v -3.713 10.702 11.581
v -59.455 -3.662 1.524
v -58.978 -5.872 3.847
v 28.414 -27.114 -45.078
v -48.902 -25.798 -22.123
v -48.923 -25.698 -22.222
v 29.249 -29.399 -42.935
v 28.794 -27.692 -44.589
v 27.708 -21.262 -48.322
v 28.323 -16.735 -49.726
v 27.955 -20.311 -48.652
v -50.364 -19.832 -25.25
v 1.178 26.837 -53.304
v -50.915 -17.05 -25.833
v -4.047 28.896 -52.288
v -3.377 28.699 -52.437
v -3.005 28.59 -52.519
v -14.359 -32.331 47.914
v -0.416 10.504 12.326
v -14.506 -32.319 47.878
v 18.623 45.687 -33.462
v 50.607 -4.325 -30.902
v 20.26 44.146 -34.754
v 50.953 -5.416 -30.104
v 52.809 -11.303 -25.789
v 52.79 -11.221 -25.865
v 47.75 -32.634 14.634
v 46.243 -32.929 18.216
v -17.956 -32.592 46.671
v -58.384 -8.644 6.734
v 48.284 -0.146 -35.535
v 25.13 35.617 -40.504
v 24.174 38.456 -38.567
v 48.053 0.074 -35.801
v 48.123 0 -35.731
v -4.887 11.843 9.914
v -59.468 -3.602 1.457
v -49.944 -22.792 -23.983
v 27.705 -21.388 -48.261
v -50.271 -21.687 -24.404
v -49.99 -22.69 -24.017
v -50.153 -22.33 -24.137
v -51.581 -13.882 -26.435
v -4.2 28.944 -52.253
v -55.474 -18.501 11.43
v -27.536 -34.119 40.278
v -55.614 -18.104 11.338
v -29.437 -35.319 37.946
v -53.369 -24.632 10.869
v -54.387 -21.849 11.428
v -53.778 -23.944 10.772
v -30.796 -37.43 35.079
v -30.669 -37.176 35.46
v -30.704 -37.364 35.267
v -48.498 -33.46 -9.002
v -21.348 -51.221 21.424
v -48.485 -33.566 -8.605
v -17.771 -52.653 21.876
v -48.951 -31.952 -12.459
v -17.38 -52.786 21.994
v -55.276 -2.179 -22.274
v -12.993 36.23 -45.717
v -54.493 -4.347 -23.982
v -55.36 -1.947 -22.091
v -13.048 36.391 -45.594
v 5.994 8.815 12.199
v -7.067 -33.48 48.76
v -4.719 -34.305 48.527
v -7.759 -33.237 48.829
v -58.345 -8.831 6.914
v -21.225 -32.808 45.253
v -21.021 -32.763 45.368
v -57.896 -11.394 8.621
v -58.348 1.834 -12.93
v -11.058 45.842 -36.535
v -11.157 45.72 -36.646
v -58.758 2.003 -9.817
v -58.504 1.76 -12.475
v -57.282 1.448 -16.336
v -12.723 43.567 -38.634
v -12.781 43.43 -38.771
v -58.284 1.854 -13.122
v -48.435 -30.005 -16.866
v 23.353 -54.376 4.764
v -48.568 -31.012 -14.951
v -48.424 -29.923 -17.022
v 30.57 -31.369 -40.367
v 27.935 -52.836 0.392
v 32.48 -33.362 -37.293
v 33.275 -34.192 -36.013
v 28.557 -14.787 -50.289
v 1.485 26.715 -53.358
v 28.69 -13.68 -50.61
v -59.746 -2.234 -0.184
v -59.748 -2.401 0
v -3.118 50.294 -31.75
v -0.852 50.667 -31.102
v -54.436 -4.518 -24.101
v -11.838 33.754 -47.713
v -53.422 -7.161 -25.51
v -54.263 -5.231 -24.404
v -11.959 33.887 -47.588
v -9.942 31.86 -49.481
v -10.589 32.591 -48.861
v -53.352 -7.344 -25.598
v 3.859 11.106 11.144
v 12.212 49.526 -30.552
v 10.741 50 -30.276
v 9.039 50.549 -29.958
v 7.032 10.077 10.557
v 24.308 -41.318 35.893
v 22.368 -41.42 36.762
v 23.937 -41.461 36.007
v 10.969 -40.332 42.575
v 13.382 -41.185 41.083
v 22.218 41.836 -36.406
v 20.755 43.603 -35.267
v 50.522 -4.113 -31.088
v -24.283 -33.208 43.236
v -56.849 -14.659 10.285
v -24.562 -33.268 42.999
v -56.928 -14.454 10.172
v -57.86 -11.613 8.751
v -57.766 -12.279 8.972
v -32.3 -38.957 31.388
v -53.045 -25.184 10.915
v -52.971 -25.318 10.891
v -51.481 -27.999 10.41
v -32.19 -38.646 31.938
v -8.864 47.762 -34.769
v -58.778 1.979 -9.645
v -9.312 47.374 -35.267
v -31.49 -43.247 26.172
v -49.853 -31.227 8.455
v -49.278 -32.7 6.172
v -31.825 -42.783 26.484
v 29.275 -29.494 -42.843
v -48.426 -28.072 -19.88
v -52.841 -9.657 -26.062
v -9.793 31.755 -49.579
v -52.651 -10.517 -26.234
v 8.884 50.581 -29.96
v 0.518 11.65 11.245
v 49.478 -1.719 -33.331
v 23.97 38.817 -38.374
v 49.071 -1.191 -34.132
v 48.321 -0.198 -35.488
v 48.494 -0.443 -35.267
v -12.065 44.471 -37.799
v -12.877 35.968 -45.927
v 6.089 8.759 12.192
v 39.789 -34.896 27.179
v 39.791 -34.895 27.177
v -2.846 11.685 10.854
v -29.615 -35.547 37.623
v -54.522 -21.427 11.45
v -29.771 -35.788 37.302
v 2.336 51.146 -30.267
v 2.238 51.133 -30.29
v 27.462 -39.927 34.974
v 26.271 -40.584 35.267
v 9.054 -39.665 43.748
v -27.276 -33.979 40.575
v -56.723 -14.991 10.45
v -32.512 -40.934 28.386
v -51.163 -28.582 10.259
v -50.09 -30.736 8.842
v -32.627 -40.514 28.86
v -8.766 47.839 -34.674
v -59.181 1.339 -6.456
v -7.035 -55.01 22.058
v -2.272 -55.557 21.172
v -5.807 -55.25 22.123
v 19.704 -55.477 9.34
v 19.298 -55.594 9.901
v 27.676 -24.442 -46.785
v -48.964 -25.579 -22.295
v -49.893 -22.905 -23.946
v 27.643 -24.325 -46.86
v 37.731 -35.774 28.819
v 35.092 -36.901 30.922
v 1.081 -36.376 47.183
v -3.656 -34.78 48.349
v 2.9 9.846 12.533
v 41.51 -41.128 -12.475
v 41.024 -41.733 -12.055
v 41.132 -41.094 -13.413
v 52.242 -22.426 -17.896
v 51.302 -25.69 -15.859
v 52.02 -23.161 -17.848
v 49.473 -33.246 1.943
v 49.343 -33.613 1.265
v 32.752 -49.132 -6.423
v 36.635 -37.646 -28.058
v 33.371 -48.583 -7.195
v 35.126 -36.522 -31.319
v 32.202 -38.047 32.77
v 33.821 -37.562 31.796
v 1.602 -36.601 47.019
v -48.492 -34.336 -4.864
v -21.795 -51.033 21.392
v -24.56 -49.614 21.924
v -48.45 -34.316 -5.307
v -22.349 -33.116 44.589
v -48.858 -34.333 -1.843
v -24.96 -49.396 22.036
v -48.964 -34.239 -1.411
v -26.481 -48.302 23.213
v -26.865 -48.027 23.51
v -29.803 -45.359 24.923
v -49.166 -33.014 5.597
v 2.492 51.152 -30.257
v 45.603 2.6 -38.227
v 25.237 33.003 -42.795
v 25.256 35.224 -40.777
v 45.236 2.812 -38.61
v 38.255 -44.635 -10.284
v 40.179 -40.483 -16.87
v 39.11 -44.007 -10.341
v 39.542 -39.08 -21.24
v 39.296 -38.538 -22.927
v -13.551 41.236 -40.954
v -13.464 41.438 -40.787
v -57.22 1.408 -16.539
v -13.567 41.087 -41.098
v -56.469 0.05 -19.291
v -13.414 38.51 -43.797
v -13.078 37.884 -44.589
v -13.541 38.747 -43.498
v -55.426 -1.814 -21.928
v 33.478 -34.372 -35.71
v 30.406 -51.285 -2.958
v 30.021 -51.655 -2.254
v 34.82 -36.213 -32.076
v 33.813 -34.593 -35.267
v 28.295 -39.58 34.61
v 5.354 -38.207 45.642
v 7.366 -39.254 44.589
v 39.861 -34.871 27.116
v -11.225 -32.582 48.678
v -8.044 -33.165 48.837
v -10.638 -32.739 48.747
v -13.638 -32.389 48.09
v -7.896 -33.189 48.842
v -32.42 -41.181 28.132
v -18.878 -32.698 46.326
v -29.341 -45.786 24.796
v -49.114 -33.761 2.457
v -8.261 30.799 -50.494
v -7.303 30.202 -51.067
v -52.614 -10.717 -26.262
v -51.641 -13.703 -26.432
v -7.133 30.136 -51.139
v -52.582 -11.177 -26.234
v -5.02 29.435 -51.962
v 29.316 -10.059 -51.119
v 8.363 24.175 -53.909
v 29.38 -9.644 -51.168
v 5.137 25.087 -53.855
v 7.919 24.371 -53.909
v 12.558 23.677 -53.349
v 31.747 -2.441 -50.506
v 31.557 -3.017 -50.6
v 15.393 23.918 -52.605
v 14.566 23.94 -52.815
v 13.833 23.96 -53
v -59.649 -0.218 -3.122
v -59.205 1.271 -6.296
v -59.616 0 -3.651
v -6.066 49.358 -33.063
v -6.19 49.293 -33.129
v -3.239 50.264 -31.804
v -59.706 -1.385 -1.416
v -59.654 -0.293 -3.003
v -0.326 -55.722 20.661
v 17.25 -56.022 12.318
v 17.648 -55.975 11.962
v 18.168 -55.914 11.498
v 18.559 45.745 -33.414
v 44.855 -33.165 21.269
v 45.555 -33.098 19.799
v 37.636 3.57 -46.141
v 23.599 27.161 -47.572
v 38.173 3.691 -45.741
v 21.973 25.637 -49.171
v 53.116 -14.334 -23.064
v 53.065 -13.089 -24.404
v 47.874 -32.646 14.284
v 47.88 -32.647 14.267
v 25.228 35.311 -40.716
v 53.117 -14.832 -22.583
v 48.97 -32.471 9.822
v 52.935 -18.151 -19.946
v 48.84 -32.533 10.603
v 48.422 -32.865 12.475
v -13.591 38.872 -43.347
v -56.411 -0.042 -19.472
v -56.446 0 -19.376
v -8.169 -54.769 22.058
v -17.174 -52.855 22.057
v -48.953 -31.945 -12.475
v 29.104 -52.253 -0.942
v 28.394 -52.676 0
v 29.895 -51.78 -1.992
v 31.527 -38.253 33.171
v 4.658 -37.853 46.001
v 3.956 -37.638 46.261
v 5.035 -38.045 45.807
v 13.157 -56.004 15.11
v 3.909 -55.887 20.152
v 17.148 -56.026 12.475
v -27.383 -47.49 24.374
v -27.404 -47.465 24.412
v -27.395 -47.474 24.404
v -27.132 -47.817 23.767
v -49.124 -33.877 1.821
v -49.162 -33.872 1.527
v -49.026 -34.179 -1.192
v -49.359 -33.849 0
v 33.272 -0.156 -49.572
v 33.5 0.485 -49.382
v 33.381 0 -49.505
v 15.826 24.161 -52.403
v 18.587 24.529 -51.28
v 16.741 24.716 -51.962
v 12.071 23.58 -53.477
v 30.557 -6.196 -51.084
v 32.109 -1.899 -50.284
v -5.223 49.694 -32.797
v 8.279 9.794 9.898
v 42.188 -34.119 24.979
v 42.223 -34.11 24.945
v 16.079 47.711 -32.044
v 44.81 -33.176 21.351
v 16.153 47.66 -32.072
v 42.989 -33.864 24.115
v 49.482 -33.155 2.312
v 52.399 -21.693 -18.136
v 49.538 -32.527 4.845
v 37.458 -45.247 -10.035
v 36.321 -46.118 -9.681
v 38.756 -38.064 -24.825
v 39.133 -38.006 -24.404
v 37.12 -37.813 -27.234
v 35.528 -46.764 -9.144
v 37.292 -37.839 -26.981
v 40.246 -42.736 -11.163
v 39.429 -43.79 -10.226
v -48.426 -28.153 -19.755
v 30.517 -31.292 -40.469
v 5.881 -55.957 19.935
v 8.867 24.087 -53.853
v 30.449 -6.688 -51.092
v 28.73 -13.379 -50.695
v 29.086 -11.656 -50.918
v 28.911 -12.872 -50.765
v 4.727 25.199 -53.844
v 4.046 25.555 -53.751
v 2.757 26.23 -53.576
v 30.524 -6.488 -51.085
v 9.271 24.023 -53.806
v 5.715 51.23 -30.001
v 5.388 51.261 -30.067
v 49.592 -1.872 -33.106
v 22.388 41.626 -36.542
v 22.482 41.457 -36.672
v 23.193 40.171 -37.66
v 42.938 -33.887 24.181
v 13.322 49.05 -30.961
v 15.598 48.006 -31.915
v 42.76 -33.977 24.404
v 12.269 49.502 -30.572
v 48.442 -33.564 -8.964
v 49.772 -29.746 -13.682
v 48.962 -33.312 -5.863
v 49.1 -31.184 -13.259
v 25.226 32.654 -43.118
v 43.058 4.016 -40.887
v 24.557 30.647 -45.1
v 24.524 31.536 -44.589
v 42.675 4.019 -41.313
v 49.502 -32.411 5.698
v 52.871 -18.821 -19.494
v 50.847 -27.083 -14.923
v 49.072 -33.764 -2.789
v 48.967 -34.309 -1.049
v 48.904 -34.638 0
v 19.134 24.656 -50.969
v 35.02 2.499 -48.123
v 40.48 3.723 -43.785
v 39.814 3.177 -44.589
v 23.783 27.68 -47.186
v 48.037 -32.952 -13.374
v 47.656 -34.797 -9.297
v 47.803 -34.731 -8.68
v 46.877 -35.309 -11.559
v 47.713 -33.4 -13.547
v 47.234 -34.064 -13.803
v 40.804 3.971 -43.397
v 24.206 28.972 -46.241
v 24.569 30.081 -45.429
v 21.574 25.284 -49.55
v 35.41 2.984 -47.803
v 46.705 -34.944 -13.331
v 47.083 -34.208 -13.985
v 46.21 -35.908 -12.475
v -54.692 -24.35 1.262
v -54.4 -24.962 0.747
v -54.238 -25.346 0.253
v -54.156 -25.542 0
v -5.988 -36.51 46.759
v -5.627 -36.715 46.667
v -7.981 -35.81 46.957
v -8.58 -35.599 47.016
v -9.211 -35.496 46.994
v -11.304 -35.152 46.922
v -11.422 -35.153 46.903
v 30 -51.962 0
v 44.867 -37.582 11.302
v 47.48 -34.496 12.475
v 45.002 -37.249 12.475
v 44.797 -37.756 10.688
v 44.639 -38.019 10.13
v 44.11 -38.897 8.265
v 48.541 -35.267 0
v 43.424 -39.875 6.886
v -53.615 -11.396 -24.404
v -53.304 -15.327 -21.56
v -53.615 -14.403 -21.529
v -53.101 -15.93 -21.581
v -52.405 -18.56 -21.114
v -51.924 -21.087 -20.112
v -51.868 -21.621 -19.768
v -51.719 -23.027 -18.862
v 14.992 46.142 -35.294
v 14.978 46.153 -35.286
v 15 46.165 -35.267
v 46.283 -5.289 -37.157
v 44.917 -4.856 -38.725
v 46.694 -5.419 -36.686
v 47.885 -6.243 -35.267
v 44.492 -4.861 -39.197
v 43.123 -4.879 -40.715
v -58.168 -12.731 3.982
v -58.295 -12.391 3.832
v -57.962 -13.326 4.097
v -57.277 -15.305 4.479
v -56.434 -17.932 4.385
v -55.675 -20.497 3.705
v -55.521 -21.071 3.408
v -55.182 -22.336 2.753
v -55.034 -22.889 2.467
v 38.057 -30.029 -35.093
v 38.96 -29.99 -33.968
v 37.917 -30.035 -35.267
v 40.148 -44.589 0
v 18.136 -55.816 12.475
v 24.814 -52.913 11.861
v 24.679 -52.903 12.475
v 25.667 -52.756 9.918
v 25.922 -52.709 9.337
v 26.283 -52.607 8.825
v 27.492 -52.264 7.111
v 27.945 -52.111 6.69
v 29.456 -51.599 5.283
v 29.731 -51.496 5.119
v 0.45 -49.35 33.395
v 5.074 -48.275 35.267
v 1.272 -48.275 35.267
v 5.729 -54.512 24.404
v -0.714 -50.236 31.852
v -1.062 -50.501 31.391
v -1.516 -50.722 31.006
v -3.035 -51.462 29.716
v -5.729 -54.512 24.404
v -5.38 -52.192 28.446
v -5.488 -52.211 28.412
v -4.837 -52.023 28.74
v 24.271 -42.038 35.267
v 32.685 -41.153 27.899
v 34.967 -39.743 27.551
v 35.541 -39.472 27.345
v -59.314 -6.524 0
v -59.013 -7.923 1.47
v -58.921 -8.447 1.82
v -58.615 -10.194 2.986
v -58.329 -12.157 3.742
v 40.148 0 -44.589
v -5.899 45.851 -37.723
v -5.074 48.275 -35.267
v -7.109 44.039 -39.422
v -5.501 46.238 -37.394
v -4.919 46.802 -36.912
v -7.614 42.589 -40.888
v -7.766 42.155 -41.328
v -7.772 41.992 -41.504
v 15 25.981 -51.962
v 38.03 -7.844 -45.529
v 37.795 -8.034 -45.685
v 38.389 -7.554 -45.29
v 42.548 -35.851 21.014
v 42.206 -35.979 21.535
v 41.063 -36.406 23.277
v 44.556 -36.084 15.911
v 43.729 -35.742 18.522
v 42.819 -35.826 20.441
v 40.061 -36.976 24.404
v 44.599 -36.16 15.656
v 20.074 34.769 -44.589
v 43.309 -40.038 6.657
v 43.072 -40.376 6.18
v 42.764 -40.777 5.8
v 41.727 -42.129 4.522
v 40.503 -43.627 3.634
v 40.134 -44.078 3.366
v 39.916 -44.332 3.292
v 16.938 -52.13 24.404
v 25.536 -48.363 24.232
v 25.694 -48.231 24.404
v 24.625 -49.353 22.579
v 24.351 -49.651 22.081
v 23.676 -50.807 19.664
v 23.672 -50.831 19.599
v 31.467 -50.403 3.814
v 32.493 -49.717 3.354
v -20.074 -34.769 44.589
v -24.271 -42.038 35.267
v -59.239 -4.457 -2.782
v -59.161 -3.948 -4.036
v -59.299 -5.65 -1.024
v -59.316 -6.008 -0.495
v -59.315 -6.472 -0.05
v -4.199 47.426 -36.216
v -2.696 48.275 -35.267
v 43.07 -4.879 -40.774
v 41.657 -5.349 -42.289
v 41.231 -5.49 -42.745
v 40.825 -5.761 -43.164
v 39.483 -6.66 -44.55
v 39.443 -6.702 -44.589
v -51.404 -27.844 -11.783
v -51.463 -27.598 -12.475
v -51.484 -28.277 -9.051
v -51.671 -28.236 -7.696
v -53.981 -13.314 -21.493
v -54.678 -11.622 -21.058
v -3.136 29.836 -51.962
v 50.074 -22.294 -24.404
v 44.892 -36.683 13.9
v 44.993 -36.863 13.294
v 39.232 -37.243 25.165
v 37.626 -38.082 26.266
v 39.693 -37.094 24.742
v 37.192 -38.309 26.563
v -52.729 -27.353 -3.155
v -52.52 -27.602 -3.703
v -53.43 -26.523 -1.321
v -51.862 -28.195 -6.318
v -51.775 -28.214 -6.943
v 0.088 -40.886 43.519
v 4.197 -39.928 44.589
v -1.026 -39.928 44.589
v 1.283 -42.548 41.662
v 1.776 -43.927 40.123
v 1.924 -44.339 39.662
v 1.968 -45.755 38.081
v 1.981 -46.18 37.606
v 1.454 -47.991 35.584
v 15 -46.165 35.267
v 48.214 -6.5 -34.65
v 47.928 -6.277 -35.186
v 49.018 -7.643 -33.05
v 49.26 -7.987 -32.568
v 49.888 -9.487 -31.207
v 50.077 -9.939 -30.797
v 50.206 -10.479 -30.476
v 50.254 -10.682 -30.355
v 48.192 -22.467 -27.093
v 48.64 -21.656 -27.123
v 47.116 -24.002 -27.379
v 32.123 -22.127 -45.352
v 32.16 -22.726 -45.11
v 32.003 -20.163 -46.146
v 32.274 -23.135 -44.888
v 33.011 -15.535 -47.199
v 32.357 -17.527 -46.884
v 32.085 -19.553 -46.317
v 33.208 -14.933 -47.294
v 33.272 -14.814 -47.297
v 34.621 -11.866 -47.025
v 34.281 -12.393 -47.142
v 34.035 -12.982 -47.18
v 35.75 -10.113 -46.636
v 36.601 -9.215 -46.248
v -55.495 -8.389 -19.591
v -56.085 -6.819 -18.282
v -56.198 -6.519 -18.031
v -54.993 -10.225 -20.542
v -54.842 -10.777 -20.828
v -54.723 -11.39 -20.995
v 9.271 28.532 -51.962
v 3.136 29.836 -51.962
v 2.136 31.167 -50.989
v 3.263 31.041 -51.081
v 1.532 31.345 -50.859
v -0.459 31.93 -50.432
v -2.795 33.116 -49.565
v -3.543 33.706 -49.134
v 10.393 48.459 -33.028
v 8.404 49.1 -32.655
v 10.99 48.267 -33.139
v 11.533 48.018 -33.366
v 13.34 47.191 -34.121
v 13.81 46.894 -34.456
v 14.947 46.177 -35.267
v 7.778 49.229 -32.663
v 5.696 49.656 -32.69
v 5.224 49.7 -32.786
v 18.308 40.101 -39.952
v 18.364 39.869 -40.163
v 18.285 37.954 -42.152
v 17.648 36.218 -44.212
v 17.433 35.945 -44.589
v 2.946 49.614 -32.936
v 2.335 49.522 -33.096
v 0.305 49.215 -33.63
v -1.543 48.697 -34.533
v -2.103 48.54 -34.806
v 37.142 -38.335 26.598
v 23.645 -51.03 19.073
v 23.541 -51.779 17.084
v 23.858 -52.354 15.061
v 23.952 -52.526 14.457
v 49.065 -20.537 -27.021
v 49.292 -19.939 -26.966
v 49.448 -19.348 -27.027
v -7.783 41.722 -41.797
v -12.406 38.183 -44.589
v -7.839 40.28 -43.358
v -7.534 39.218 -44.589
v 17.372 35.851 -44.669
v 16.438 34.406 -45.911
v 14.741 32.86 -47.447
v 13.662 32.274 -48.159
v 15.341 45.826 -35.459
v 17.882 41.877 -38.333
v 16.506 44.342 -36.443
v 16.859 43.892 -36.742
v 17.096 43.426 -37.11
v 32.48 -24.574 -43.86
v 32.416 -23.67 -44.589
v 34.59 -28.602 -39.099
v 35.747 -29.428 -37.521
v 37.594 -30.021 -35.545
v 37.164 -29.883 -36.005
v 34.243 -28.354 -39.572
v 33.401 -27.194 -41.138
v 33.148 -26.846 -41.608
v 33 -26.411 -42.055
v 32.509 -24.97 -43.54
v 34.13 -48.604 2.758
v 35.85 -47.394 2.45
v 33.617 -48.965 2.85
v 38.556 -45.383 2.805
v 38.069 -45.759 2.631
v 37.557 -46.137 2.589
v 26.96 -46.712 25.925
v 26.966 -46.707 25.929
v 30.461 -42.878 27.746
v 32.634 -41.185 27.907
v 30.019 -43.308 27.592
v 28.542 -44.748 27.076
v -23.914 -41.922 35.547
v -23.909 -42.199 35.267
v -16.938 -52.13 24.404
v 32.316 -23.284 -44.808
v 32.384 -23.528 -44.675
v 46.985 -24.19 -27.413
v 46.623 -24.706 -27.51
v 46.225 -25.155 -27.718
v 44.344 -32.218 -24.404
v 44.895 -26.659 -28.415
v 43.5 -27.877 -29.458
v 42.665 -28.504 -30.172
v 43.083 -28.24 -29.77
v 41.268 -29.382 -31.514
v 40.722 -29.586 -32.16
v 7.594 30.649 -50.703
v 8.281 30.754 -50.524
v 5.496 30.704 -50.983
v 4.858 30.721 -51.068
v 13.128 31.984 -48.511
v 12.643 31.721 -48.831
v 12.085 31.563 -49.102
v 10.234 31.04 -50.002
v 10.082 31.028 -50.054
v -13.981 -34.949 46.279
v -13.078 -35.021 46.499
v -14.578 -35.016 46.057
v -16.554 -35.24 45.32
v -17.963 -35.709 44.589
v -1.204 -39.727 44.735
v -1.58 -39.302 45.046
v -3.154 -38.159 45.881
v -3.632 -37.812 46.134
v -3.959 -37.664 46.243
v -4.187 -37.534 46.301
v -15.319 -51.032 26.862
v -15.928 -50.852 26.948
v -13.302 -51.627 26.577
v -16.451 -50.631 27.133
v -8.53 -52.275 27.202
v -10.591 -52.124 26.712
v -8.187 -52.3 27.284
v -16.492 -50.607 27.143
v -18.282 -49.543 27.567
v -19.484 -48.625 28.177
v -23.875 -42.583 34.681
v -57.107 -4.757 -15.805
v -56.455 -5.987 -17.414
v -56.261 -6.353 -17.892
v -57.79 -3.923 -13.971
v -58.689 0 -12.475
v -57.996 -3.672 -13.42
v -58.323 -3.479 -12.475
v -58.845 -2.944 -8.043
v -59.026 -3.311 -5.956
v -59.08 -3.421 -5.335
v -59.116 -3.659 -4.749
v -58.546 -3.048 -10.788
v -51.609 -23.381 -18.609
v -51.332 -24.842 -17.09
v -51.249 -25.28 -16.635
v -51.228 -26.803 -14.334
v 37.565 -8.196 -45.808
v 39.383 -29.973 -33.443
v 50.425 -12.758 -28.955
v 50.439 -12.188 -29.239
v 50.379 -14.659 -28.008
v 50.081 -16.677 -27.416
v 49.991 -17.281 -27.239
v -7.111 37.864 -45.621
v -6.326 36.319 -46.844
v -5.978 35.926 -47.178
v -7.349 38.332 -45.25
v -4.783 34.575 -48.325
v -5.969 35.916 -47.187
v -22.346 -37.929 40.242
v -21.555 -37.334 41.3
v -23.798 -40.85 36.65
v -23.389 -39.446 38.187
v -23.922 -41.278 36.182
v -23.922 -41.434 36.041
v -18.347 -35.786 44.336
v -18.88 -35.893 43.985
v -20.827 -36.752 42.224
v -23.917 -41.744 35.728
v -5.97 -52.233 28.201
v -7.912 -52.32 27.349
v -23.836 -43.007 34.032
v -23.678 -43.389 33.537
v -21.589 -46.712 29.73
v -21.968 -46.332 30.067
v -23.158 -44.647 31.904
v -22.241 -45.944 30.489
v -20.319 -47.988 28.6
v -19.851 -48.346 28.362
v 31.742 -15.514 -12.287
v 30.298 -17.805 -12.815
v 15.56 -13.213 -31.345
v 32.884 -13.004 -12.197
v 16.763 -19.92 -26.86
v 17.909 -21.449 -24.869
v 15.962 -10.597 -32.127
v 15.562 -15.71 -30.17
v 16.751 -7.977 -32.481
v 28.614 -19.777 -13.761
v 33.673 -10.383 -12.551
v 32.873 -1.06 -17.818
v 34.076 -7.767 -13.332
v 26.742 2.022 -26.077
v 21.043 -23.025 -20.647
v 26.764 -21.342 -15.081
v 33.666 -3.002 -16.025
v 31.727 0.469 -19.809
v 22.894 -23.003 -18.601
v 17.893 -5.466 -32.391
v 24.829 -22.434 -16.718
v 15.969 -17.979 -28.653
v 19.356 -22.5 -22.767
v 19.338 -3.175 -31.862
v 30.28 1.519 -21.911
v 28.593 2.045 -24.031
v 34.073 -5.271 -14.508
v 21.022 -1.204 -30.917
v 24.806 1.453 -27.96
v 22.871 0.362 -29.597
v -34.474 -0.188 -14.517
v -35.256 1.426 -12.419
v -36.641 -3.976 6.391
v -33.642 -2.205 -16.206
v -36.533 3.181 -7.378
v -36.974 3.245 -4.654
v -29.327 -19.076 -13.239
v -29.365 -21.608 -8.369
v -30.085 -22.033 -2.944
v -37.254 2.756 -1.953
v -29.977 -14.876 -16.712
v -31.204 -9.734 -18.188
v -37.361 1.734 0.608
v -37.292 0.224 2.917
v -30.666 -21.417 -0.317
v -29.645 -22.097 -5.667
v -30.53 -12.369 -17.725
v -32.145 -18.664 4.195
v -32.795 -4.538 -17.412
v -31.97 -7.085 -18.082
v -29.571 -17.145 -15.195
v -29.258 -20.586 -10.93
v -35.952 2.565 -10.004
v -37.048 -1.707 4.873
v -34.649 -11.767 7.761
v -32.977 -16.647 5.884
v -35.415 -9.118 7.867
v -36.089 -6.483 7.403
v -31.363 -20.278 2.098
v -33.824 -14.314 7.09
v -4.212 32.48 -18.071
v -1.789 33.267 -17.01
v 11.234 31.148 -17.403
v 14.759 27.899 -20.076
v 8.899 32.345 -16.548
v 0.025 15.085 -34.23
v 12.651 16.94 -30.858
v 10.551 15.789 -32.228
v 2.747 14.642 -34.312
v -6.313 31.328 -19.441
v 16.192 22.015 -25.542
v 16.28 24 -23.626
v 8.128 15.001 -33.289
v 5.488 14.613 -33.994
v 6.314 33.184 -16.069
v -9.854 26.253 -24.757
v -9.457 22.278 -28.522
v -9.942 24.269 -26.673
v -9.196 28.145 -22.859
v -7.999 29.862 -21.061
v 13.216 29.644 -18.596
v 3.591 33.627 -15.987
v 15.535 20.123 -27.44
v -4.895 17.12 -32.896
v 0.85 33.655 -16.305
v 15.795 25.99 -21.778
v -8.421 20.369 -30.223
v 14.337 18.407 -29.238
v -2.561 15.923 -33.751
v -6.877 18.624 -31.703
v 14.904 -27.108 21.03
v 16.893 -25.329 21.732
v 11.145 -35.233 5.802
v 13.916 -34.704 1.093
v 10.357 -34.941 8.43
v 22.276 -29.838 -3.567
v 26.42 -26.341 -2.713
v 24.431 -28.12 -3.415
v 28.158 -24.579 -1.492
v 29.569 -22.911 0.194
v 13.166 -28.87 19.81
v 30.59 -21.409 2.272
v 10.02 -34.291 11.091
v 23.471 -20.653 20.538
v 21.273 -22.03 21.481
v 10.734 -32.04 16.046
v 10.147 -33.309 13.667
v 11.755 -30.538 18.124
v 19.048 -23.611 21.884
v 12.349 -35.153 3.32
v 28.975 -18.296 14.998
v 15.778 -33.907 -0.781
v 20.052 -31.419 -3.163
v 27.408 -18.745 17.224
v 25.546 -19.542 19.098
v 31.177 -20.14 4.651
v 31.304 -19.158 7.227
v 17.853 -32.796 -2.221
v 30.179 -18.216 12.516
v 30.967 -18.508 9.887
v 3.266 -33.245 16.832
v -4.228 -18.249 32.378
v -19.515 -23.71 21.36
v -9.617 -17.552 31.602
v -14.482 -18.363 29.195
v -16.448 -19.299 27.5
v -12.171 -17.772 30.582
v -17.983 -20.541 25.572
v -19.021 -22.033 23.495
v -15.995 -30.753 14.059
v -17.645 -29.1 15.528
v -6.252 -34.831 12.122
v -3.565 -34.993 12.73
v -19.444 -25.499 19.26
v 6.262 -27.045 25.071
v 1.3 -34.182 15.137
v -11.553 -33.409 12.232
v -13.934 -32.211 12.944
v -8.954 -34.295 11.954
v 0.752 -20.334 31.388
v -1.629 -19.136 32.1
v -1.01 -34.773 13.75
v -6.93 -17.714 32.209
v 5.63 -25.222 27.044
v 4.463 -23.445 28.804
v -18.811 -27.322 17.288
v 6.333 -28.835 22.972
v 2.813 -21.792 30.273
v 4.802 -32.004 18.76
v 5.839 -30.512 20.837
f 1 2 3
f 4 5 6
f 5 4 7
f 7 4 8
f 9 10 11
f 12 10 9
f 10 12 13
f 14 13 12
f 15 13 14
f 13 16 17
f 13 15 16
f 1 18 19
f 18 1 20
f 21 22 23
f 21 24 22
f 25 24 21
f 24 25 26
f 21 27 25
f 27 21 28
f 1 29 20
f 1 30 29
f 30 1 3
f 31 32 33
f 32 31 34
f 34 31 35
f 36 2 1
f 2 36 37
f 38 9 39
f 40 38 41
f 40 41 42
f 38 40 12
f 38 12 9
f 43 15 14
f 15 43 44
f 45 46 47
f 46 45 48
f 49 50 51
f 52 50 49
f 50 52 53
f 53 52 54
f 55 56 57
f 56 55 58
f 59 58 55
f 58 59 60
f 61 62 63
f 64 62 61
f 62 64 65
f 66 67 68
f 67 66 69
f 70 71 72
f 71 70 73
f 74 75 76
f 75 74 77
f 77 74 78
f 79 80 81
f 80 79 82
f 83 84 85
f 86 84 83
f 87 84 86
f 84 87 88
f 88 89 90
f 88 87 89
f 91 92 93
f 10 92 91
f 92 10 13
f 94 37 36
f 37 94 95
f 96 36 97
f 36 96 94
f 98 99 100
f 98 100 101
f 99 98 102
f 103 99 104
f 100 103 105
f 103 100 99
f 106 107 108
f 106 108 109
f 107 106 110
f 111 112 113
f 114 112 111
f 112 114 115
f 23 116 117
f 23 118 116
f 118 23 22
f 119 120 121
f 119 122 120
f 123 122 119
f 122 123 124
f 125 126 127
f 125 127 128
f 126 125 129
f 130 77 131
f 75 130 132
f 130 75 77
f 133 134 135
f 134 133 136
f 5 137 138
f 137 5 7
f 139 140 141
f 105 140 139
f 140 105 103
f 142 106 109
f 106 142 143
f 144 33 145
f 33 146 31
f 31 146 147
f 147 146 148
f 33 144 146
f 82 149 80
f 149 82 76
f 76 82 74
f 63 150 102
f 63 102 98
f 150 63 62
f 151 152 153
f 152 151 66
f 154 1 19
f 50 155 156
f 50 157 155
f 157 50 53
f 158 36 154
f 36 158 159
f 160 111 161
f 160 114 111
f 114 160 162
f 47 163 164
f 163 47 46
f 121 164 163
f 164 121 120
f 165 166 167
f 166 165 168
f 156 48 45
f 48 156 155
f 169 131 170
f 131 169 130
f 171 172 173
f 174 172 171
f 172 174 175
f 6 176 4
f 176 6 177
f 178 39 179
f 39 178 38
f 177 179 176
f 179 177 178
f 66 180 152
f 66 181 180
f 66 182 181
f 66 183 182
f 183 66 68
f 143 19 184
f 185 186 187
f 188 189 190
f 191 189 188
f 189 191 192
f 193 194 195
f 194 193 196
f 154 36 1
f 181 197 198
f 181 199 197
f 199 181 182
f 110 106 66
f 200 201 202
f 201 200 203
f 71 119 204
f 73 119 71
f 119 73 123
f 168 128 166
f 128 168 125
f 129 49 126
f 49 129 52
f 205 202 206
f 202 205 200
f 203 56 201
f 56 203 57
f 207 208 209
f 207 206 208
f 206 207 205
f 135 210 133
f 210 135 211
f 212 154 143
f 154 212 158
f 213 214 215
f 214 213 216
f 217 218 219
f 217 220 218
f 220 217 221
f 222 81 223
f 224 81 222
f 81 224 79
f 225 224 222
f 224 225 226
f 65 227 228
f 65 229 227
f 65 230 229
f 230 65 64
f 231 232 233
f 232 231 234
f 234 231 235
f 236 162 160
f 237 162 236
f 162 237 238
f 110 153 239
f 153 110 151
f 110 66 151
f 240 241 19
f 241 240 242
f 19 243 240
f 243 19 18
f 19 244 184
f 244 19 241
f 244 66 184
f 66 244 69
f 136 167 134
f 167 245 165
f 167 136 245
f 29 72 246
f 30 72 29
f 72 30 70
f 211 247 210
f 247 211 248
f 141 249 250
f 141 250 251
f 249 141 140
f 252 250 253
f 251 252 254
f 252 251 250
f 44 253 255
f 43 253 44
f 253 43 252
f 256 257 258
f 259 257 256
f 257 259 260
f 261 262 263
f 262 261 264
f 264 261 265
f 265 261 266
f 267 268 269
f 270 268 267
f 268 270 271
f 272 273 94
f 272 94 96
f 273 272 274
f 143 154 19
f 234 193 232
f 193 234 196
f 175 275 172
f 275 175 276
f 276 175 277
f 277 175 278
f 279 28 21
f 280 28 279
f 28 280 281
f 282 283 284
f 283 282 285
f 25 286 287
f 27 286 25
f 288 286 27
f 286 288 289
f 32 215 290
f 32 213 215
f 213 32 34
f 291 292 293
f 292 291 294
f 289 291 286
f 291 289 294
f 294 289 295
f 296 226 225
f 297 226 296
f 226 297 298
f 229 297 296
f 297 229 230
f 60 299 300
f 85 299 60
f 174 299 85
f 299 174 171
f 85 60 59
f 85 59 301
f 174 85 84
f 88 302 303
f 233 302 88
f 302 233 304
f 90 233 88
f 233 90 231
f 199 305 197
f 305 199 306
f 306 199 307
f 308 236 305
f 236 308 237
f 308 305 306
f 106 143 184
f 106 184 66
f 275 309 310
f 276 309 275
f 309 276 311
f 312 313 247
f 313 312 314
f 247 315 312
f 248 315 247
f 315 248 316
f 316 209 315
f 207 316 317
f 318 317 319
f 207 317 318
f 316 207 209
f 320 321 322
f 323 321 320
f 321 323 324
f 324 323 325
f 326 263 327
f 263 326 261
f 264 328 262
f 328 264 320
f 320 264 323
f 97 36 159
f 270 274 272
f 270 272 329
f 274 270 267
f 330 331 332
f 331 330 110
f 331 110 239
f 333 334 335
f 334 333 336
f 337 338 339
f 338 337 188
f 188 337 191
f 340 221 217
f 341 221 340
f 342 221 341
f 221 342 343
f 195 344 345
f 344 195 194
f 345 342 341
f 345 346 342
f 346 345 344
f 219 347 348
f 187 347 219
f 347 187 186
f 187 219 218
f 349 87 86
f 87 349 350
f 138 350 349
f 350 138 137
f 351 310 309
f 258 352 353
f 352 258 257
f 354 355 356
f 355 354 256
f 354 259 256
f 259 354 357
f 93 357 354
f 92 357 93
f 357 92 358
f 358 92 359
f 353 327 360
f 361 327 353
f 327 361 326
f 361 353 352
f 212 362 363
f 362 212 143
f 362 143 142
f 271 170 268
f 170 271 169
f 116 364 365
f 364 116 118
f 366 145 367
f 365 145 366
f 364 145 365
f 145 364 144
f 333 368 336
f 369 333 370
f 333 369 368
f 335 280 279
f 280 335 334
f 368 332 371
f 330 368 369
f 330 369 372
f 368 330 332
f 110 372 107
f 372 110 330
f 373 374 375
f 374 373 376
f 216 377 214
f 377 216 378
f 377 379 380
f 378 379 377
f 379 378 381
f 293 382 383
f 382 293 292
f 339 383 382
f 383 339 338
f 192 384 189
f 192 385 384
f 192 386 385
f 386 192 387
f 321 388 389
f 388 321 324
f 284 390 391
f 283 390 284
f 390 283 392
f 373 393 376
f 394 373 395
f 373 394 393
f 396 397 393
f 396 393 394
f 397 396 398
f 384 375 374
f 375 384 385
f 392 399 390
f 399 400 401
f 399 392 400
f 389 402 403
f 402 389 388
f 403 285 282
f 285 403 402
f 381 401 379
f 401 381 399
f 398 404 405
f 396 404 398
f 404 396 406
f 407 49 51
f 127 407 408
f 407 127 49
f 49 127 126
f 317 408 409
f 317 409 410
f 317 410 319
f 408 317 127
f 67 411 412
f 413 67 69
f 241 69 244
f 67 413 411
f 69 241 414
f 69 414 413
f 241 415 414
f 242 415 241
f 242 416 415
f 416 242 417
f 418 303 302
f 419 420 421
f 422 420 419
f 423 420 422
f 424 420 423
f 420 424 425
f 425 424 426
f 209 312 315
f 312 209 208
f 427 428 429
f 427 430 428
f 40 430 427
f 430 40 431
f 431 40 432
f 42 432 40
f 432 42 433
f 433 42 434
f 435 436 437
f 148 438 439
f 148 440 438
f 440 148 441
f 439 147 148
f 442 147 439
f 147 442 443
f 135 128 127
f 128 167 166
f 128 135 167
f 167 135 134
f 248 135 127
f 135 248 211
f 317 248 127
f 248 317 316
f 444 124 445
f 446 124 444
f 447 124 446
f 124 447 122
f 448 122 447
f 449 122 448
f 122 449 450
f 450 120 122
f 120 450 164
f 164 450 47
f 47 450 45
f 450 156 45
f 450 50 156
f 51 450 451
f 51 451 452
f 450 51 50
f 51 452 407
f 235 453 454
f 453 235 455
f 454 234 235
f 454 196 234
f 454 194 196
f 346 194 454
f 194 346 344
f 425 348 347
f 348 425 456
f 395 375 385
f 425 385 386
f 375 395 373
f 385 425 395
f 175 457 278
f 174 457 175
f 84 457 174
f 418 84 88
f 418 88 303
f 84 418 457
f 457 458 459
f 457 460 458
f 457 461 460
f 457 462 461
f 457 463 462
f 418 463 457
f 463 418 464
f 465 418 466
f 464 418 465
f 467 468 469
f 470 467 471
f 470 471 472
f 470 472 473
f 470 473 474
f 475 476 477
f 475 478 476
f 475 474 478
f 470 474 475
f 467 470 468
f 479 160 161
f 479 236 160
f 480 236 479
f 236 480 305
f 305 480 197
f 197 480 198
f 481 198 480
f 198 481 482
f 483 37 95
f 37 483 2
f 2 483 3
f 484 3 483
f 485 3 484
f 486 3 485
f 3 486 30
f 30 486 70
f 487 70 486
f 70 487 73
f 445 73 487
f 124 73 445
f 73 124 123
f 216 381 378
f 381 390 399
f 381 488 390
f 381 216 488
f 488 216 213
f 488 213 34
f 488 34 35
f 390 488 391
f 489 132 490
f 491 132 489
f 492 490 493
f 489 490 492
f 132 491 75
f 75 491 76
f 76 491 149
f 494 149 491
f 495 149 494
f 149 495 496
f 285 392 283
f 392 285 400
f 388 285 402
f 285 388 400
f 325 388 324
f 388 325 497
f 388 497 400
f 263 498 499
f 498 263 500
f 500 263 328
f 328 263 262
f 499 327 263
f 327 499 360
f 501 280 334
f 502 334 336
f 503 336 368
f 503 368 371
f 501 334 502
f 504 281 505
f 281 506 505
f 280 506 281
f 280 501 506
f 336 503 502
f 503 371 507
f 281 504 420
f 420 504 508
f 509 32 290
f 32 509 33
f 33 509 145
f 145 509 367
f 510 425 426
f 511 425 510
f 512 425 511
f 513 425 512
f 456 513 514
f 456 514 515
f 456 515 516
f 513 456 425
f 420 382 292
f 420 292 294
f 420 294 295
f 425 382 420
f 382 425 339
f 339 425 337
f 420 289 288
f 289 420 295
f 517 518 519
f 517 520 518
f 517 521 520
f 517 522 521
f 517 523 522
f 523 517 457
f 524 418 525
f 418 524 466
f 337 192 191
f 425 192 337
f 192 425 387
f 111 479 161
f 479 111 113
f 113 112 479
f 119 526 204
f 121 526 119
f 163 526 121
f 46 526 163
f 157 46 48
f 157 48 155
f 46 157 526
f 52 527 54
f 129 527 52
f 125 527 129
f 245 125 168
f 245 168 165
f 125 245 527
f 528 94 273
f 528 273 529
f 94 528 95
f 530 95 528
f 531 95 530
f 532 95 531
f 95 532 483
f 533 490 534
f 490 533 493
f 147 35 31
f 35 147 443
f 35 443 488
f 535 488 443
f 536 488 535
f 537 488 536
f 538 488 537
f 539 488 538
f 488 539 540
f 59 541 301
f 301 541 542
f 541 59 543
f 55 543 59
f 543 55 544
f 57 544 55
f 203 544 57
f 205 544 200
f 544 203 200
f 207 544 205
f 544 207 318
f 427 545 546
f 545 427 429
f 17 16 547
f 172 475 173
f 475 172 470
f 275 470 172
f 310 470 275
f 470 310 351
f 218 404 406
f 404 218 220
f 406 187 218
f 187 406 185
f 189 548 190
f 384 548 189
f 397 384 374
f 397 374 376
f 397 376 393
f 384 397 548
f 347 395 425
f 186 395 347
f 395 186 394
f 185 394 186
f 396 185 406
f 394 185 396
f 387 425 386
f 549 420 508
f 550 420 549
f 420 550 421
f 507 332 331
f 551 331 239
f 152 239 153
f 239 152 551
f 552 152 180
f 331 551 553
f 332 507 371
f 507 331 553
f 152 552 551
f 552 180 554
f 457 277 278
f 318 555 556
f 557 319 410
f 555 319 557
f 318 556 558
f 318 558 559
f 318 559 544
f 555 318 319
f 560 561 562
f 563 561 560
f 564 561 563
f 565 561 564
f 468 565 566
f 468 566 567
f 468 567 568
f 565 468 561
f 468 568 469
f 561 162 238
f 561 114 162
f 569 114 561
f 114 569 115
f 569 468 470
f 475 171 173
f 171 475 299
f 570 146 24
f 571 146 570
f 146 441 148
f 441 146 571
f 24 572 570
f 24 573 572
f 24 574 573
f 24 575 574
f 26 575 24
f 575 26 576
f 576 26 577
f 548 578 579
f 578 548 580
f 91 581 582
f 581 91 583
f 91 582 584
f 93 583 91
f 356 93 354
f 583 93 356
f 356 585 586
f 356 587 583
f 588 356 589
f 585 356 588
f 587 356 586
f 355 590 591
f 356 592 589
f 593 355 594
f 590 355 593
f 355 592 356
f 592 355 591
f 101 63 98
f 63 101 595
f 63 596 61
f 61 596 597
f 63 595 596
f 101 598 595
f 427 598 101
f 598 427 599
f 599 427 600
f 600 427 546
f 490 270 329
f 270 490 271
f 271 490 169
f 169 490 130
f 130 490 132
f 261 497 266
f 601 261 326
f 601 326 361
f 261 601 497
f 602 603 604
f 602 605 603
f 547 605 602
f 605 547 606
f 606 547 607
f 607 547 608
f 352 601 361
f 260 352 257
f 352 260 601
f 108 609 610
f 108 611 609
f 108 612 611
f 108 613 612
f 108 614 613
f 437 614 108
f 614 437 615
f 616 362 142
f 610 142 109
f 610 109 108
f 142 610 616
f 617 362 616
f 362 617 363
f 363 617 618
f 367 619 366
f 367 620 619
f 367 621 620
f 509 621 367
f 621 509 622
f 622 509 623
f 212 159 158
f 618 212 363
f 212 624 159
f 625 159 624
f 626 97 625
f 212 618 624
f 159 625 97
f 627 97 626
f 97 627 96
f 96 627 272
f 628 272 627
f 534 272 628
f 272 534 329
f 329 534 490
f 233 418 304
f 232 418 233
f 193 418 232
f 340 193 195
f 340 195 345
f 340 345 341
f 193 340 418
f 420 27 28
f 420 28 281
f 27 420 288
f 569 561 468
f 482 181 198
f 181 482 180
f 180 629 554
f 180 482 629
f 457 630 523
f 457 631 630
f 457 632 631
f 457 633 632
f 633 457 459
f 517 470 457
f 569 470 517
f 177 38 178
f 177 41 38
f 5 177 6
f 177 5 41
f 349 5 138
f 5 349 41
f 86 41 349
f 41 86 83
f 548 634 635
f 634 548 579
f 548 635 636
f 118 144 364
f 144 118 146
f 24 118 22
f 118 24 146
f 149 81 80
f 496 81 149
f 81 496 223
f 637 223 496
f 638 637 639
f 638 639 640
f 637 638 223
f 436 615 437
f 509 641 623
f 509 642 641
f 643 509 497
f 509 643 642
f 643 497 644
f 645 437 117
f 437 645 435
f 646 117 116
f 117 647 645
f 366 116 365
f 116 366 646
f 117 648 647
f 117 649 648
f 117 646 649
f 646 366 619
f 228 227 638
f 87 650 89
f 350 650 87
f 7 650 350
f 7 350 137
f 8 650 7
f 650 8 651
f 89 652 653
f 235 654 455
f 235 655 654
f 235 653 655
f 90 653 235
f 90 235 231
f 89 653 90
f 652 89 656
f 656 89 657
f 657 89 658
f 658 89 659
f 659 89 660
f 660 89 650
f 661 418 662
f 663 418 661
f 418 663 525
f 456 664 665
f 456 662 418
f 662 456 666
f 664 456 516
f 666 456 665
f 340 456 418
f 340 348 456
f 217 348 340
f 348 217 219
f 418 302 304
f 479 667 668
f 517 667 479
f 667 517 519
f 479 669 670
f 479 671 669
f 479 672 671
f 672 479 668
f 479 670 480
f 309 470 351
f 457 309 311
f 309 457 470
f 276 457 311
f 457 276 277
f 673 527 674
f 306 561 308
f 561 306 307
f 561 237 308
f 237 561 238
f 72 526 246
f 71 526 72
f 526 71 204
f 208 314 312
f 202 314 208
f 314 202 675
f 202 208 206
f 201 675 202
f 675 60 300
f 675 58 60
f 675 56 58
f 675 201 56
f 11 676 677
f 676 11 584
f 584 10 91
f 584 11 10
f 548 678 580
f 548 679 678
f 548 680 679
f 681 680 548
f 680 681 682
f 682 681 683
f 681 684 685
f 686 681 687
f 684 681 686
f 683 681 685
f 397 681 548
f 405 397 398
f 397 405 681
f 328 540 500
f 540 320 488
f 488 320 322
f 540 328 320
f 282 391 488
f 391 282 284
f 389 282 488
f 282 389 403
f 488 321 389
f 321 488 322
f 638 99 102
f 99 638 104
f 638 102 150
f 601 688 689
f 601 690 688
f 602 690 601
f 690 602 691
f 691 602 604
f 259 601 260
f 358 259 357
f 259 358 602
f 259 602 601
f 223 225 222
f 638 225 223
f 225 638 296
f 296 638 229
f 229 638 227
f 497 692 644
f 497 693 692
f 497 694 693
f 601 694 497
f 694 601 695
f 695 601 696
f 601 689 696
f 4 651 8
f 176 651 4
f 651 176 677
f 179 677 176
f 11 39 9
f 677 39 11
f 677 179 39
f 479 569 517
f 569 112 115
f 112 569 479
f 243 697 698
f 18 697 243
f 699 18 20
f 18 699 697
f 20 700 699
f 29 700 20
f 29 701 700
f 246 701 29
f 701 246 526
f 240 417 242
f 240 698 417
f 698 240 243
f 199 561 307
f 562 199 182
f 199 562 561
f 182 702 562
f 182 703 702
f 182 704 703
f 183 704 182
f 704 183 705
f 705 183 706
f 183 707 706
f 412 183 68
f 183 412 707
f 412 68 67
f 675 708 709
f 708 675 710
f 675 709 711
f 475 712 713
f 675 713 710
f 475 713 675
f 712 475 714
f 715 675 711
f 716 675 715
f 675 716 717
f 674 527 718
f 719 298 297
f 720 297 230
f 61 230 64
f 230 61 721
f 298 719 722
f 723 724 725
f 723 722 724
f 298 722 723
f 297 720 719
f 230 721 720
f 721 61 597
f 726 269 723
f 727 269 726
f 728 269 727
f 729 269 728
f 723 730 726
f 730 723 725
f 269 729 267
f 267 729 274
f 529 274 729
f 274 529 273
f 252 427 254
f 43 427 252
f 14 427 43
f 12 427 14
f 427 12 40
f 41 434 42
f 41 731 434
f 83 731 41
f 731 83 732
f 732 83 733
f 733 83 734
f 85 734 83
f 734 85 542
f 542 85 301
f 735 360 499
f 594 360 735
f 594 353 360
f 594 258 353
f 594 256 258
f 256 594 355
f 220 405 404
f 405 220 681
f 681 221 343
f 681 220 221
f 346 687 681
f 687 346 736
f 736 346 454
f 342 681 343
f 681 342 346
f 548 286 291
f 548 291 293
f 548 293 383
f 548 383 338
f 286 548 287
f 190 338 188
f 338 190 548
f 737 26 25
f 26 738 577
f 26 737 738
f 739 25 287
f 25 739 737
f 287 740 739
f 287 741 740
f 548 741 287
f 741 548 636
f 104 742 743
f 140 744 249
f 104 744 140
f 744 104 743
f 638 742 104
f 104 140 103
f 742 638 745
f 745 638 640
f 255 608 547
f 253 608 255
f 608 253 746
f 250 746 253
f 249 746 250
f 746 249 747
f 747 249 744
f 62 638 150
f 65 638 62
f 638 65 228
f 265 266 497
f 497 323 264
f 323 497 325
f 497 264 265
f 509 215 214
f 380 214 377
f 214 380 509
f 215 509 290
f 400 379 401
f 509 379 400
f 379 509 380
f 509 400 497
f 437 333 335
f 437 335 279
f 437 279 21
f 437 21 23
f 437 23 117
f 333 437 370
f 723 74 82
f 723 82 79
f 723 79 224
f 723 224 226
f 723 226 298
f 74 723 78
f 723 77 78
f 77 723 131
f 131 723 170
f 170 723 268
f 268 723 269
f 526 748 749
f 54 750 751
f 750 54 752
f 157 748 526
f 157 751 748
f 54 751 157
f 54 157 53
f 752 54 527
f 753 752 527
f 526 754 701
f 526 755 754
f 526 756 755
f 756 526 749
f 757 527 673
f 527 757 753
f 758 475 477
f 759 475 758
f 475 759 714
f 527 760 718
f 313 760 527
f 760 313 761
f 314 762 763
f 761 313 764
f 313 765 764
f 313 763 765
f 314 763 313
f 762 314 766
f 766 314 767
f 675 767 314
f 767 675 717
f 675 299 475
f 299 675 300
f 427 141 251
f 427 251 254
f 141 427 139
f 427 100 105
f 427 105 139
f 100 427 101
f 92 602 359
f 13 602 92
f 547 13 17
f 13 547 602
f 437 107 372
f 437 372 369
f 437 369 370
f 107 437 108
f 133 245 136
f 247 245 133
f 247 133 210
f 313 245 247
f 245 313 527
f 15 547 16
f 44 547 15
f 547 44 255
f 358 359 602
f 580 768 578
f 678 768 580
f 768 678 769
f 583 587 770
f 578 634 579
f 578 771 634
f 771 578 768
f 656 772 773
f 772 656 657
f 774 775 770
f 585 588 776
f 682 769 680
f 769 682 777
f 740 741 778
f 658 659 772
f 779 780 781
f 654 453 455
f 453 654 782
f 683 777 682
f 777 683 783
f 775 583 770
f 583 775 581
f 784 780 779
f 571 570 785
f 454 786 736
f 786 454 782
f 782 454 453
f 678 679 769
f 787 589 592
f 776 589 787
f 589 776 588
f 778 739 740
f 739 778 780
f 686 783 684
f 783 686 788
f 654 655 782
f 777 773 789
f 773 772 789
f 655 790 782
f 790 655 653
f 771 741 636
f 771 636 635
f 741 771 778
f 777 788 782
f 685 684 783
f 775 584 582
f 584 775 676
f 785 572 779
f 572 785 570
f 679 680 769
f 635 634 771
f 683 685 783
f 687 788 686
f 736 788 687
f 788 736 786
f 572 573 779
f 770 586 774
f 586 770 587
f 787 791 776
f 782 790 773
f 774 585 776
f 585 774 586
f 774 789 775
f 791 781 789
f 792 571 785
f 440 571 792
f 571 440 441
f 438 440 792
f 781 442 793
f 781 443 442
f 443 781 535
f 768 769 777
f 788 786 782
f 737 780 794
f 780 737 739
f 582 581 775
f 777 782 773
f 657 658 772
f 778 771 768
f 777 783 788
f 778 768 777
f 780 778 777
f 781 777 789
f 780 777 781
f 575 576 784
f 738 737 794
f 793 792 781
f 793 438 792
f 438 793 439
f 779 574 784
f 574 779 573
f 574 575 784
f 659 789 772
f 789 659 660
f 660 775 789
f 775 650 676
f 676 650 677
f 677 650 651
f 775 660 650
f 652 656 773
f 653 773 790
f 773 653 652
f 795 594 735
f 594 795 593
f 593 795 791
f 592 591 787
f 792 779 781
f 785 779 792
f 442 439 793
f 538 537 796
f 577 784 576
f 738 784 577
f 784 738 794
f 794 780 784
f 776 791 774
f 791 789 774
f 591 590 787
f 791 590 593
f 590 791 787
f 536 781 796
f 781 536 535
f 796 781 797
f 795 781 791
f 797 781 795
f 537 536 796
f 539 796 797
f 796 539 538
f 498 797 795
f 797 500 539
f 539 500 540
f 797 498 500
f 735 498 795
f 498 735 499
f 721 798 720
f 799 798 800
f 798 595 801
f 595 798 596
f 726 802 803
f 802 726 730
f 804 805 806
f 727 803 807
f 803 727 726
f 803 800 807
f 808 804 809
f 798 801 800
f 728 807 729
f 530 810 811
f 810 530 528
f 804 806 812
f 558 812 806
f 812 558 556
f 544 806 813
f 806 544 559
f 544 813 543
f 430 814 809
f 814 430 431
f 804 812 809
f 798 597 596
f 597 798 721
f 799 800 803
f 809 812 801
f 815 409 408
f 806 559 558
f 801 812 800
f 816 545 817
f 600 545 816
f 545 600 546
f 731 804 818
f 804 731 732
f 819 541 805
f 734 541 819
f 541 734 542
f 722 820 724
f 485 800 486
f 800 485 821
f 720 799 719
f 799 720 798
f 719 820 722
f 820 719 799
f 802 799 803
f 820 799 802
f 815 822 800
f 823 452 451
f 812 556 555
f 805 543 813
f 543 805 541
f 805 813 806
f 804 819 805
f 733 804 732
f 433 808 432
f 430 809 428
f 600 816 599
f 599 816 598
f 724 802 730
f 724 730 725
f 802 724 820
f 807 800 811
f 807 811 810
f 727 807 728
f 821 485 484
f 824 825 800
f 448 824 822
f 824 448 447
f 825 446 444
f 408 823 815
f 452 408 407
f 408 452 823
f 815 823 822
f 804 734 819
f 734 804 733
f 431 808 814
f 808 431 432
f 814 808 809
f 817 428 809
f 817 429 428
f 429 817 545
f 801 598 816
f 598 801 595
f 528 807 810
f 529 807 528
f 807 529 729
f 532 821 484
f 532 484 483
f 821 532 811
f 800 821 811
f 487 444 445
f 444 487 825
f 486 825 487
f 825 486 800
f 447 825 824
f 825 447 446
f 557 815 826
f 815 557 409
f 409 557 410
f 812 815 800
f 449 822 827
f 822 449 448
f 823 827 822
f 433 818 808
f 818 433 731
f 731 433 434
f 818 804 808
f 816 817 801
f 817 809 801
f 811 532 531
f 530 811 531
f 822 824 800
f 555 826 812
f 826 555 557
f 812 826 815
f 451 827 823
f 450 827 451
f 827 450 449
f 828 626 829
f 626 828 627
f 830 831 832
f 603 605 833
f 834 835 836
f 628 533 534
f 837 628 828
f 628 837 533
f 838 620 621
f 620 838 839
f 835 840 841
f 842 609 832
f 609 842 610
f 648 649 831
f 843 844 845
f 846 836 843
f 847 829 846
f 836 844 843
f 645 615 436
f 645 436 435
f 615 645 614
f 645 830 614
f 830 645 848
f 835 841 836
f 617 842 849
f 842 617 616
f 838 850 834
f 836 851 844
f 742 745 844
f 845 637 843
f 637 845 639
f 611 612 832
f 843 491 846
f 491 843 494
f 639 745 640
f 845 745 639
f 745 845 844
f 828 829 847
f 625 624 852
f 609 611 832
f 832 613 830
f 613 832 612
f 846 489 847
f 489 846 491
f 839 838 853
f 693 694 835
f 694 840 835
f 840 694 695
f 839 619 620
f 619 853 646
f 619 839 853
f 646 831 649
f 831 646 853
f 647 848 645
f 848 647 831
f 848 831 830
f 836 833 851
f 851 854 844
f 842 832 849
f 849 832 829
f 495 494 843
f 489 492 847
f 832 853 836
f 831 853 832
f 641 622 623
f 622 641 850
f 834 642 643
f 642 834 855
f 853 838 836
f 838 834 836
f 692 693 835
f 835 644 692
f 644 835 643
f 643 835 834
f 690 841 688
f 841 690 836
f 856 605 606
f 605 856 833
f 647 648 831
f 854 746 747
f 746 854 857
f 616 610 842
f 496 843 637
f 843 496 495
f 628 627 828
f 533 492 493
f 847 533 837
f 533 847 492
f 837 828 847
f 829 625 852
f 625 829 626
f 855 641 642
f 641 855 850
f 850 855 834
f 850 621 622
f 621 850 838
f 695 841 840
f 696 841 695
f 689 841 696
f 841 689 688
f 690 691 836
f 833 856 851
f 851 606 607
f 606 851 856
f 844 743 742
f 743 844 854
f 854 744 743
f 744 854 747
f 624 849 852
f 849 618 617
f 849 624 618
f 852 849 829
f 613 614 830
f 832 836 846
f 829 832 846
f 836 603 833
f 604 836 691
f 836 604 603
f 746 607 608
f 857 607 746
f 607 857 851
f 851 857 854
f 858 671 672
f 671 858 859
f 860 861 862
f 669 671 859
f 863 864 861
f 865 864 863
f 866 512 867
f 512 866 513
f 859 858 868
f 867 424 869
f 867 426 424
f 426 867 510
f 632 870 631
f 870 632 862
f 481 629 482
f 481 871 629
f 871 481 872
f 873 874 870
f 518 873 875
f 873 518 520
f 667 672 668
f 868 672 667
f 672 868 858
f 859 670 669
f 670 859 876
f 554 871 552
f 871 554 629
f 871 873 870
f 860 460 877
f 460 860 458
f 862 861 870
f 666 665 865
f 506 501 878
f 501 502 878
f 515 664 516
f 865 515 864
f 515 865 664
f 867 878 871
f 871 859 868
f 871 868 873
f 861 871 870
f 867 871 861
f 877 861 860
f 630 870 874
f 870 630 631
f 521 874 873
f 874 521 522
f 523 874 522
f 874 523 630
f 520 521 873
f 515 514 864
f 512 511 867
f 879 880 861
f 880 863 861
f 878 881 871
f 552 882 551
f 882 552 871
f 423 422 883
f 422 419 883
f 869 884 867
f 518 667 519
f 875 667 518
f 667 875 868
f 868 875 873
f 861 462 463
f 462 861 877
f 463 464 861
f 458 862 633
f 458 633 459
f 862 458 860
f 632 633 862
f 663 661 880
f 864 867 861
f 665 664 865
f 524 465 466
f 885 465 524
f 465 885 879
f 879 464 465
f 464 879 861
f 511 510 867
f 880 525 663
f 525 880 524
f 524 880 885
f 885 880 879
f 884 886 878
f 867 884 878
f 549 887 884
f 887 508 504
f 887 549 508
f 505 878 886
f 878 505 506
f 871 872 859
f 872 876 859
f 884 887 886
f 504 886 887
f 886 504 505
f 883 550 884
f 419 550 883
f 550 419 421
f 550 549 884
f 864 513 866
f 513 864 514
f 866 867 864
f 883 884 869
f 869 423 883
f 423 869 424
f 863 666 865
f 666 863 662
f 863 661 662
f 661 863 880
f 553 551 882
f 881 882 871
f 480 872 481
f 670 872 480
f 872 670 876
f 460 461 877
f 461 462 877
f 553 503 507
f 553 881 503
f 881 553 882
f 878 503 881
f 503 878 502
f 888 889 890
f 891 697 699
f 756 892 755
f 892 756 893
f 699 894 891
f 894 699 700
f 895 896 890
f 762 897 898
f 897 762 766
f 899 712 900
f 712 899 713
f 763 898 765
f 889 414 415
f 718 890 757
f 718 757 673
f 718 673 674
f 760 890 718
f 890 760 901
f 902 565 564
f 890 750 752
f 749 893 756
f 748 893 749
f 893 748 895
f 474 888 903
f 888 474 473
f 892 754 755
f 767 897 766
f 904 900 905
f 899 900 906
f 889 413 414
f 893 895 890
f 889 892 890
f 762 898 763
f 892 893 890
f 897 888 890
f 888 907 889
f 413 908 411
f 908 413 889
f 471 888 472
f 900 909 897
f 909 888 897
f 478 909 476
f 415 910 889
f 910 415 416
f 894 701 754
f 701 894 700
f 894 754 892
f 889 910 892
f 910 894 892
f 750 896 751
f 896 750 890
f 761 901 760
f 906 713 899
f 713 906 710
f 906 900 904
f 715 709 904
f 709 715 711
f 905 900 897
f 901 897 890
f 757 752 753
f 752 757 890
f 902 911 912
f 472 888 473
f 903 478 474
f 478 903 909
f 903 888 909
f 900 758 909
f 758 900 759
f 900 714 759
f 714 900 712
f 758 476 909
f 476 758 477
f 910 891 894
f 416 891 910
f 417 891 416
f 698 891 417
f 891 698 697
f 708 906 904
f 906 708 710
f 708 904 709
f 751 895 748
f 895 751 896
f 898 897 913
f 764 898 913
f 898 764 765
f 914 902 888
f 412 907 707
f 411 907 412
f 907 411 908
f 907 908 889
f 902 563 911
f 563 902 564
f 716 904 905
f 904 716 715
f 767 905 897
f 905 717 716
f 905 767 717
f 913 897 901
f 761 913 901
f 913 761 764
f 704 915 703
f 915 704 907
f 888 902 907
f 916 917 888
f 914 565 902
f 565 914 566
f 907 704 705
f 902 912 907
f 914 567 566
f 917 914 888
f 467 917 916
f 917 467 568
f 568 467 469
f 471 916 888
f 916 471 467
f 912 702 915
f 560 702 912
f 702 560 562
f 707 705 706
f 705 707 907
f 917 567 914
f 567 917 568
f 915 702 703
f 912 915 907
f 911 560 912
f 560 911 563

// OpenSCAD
difference() {
	intersection() {
		hull() {
			rotate(a = -123.3588517168, v = [0.8221247159, 0.1474510127, -0.0000000000]) {
				rotate(a = -90.0000000000, v = [0.8660254038, -0.5000000000, 0.0000000000]) {
					cylinder(h = 60, r = 16.2000000000);
				}
			}
			rotate(a = -123.3588517168, v = [0.8221247159, 0.1474510127, -0.0000000000]) {
				rotate(a = -90.0000000000, v = [0.0000000000, 1.0000000000, -0.0000000000]) {
					cylinder(h = 60, r = 16.2000000000);
				}
			}
			rotate(a = -123.3588517168, v = [0.8221247159, 0.1474510127, -0.0000000000]) {
				rotate(a = -18.4383929552, v = [0.2692672153, -0.1659253944, 0.0000000000]) {
					cylinder(h = 60, r = 16.2000000000);
				}
			}
			rotate(a = -123.3588517168, v = [0.8221247159, 0.1474510127, -0.0000000000]) {
				rotate(a = -149.1684967374, v = [0.3268370039, -0.3947774996, 0.0000000000]) {
					cylinder(h = 60, r = 16.2000000000);
				}
			}
			rotate(a = -123.3588517168, v = [0.8221247159, 0.1474510127, -0.0000000000]) {
				rotate(a = -159.6517266695, v = [-0.1948712799, 0.2879902172, 0.0000000000]) {
					cylinder(h = 60, r = 16.2000000000);
				}
			}
		}
		sphere(r = 60);
	}
	union() {
		rotate(a = -123.3588517168, v = [0.8221247159, 0.1474510127, -0.0000000000]) {
			rotate(a = -90.0000000000, v = [0.8660254038, -0.5000000000, 0.0000000000]) {
				translate(v = [0, 0, 35]) {
					cylinder(h = 100, r = 13.2000000000);
				}
			}
		}
		rotate(a = -123.3588517168, v = [0.8221247159, 0.1474510127, -0.0000000000]) {
			rotate(a = -90.0000000000, v = [0.0000000000, 1.0000000000, -0.0000000000]) {
				translate(v = [0, 0, 35]) {
					cylinder(h = 100, r = 13.2000000000);
				}
			}
		}
		rotate(a = -123.3588517168, v = [0.8221247159, 0.1474510127, -0.0000000000]) {
			rotate(a = -18.4383929552, v = [0.2692672153, -0.1659253944, 0.0000000000]) {
				translate(v = [0, 0, 35]) {
					cylinder(h = 100, r = 13.2000000000);
				}
			}
		}
		rotate(a = -123.3588517168, v = [0.8221247159, 0.1474510127, -0.0000000000]) {
			rotate(a = -149.1684967374, v = [0.3268370039, -0.3947774996, 0.0000000000]) {
				translate(v = [0, 0, 35]) {
					cylinder(h = 100, r = 13.2000000000);
				}
			}
		}
		rotate(a = -123.3588517168, v = [0.8221247159, 0.1474510127, -0.0000000000]) {
			rotate(a = -159.6517266695, v = [-0.1948712799, 0.2879902172, 0.0000000000]) {
				translate(v = [0, 0, 35]) {
					cylinder(h = 100, r = 13.2000000000);
				}
			}
		}
	}
}
